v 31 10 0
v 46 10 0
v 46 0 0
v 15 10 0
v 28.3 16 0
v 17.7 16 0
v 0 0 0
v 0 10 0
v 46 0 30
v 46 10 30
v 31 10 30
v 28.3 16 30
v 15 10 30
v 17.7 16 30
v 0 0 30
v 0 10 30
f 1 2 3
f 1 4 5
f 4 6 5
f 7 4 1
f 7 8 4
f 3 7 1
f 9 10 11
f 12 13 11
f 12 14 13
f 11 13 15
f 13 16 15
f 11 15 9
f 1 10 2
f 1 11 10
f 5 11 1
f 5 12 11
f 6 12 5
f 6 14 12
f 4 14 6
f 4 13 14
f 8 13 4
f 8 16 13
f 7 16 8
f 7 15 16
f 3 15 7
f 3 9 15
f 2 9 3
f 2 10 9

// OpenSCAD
$fn = 32;

// ----------------------------------------------------------------------
// V guide rail: dovetail, 46 mm wide
// ----------------------------------------------------------------------

// --- parameters (mm) ---
rail_w = 46;              // rail width, X
base_t = 10;              // base plate thickness
v_depth = 6;              // V feature depth / height
v_half_w = 8;             // half width of the V at the base face
plate_t = 30;             // rail length, Z (the extrusion height)
top_half_w = 5.3;         // half width at the dovetail top

dovetail_base = 2 * v_half_w;  // dovetail width at the base
dovetail_top = 2 * top_half_w;  // dovetail width at the top

profile = [[0, 0], [46, 0], [46, 10], [31, 10], [28.3, 16], [17.7, 16], [15, 10], [0, 10]];  // primary outline, 8 points, counter clockwise

// --- the one profile operation ---
linear_extrude(height = plate_t) polygon(points = profile);
